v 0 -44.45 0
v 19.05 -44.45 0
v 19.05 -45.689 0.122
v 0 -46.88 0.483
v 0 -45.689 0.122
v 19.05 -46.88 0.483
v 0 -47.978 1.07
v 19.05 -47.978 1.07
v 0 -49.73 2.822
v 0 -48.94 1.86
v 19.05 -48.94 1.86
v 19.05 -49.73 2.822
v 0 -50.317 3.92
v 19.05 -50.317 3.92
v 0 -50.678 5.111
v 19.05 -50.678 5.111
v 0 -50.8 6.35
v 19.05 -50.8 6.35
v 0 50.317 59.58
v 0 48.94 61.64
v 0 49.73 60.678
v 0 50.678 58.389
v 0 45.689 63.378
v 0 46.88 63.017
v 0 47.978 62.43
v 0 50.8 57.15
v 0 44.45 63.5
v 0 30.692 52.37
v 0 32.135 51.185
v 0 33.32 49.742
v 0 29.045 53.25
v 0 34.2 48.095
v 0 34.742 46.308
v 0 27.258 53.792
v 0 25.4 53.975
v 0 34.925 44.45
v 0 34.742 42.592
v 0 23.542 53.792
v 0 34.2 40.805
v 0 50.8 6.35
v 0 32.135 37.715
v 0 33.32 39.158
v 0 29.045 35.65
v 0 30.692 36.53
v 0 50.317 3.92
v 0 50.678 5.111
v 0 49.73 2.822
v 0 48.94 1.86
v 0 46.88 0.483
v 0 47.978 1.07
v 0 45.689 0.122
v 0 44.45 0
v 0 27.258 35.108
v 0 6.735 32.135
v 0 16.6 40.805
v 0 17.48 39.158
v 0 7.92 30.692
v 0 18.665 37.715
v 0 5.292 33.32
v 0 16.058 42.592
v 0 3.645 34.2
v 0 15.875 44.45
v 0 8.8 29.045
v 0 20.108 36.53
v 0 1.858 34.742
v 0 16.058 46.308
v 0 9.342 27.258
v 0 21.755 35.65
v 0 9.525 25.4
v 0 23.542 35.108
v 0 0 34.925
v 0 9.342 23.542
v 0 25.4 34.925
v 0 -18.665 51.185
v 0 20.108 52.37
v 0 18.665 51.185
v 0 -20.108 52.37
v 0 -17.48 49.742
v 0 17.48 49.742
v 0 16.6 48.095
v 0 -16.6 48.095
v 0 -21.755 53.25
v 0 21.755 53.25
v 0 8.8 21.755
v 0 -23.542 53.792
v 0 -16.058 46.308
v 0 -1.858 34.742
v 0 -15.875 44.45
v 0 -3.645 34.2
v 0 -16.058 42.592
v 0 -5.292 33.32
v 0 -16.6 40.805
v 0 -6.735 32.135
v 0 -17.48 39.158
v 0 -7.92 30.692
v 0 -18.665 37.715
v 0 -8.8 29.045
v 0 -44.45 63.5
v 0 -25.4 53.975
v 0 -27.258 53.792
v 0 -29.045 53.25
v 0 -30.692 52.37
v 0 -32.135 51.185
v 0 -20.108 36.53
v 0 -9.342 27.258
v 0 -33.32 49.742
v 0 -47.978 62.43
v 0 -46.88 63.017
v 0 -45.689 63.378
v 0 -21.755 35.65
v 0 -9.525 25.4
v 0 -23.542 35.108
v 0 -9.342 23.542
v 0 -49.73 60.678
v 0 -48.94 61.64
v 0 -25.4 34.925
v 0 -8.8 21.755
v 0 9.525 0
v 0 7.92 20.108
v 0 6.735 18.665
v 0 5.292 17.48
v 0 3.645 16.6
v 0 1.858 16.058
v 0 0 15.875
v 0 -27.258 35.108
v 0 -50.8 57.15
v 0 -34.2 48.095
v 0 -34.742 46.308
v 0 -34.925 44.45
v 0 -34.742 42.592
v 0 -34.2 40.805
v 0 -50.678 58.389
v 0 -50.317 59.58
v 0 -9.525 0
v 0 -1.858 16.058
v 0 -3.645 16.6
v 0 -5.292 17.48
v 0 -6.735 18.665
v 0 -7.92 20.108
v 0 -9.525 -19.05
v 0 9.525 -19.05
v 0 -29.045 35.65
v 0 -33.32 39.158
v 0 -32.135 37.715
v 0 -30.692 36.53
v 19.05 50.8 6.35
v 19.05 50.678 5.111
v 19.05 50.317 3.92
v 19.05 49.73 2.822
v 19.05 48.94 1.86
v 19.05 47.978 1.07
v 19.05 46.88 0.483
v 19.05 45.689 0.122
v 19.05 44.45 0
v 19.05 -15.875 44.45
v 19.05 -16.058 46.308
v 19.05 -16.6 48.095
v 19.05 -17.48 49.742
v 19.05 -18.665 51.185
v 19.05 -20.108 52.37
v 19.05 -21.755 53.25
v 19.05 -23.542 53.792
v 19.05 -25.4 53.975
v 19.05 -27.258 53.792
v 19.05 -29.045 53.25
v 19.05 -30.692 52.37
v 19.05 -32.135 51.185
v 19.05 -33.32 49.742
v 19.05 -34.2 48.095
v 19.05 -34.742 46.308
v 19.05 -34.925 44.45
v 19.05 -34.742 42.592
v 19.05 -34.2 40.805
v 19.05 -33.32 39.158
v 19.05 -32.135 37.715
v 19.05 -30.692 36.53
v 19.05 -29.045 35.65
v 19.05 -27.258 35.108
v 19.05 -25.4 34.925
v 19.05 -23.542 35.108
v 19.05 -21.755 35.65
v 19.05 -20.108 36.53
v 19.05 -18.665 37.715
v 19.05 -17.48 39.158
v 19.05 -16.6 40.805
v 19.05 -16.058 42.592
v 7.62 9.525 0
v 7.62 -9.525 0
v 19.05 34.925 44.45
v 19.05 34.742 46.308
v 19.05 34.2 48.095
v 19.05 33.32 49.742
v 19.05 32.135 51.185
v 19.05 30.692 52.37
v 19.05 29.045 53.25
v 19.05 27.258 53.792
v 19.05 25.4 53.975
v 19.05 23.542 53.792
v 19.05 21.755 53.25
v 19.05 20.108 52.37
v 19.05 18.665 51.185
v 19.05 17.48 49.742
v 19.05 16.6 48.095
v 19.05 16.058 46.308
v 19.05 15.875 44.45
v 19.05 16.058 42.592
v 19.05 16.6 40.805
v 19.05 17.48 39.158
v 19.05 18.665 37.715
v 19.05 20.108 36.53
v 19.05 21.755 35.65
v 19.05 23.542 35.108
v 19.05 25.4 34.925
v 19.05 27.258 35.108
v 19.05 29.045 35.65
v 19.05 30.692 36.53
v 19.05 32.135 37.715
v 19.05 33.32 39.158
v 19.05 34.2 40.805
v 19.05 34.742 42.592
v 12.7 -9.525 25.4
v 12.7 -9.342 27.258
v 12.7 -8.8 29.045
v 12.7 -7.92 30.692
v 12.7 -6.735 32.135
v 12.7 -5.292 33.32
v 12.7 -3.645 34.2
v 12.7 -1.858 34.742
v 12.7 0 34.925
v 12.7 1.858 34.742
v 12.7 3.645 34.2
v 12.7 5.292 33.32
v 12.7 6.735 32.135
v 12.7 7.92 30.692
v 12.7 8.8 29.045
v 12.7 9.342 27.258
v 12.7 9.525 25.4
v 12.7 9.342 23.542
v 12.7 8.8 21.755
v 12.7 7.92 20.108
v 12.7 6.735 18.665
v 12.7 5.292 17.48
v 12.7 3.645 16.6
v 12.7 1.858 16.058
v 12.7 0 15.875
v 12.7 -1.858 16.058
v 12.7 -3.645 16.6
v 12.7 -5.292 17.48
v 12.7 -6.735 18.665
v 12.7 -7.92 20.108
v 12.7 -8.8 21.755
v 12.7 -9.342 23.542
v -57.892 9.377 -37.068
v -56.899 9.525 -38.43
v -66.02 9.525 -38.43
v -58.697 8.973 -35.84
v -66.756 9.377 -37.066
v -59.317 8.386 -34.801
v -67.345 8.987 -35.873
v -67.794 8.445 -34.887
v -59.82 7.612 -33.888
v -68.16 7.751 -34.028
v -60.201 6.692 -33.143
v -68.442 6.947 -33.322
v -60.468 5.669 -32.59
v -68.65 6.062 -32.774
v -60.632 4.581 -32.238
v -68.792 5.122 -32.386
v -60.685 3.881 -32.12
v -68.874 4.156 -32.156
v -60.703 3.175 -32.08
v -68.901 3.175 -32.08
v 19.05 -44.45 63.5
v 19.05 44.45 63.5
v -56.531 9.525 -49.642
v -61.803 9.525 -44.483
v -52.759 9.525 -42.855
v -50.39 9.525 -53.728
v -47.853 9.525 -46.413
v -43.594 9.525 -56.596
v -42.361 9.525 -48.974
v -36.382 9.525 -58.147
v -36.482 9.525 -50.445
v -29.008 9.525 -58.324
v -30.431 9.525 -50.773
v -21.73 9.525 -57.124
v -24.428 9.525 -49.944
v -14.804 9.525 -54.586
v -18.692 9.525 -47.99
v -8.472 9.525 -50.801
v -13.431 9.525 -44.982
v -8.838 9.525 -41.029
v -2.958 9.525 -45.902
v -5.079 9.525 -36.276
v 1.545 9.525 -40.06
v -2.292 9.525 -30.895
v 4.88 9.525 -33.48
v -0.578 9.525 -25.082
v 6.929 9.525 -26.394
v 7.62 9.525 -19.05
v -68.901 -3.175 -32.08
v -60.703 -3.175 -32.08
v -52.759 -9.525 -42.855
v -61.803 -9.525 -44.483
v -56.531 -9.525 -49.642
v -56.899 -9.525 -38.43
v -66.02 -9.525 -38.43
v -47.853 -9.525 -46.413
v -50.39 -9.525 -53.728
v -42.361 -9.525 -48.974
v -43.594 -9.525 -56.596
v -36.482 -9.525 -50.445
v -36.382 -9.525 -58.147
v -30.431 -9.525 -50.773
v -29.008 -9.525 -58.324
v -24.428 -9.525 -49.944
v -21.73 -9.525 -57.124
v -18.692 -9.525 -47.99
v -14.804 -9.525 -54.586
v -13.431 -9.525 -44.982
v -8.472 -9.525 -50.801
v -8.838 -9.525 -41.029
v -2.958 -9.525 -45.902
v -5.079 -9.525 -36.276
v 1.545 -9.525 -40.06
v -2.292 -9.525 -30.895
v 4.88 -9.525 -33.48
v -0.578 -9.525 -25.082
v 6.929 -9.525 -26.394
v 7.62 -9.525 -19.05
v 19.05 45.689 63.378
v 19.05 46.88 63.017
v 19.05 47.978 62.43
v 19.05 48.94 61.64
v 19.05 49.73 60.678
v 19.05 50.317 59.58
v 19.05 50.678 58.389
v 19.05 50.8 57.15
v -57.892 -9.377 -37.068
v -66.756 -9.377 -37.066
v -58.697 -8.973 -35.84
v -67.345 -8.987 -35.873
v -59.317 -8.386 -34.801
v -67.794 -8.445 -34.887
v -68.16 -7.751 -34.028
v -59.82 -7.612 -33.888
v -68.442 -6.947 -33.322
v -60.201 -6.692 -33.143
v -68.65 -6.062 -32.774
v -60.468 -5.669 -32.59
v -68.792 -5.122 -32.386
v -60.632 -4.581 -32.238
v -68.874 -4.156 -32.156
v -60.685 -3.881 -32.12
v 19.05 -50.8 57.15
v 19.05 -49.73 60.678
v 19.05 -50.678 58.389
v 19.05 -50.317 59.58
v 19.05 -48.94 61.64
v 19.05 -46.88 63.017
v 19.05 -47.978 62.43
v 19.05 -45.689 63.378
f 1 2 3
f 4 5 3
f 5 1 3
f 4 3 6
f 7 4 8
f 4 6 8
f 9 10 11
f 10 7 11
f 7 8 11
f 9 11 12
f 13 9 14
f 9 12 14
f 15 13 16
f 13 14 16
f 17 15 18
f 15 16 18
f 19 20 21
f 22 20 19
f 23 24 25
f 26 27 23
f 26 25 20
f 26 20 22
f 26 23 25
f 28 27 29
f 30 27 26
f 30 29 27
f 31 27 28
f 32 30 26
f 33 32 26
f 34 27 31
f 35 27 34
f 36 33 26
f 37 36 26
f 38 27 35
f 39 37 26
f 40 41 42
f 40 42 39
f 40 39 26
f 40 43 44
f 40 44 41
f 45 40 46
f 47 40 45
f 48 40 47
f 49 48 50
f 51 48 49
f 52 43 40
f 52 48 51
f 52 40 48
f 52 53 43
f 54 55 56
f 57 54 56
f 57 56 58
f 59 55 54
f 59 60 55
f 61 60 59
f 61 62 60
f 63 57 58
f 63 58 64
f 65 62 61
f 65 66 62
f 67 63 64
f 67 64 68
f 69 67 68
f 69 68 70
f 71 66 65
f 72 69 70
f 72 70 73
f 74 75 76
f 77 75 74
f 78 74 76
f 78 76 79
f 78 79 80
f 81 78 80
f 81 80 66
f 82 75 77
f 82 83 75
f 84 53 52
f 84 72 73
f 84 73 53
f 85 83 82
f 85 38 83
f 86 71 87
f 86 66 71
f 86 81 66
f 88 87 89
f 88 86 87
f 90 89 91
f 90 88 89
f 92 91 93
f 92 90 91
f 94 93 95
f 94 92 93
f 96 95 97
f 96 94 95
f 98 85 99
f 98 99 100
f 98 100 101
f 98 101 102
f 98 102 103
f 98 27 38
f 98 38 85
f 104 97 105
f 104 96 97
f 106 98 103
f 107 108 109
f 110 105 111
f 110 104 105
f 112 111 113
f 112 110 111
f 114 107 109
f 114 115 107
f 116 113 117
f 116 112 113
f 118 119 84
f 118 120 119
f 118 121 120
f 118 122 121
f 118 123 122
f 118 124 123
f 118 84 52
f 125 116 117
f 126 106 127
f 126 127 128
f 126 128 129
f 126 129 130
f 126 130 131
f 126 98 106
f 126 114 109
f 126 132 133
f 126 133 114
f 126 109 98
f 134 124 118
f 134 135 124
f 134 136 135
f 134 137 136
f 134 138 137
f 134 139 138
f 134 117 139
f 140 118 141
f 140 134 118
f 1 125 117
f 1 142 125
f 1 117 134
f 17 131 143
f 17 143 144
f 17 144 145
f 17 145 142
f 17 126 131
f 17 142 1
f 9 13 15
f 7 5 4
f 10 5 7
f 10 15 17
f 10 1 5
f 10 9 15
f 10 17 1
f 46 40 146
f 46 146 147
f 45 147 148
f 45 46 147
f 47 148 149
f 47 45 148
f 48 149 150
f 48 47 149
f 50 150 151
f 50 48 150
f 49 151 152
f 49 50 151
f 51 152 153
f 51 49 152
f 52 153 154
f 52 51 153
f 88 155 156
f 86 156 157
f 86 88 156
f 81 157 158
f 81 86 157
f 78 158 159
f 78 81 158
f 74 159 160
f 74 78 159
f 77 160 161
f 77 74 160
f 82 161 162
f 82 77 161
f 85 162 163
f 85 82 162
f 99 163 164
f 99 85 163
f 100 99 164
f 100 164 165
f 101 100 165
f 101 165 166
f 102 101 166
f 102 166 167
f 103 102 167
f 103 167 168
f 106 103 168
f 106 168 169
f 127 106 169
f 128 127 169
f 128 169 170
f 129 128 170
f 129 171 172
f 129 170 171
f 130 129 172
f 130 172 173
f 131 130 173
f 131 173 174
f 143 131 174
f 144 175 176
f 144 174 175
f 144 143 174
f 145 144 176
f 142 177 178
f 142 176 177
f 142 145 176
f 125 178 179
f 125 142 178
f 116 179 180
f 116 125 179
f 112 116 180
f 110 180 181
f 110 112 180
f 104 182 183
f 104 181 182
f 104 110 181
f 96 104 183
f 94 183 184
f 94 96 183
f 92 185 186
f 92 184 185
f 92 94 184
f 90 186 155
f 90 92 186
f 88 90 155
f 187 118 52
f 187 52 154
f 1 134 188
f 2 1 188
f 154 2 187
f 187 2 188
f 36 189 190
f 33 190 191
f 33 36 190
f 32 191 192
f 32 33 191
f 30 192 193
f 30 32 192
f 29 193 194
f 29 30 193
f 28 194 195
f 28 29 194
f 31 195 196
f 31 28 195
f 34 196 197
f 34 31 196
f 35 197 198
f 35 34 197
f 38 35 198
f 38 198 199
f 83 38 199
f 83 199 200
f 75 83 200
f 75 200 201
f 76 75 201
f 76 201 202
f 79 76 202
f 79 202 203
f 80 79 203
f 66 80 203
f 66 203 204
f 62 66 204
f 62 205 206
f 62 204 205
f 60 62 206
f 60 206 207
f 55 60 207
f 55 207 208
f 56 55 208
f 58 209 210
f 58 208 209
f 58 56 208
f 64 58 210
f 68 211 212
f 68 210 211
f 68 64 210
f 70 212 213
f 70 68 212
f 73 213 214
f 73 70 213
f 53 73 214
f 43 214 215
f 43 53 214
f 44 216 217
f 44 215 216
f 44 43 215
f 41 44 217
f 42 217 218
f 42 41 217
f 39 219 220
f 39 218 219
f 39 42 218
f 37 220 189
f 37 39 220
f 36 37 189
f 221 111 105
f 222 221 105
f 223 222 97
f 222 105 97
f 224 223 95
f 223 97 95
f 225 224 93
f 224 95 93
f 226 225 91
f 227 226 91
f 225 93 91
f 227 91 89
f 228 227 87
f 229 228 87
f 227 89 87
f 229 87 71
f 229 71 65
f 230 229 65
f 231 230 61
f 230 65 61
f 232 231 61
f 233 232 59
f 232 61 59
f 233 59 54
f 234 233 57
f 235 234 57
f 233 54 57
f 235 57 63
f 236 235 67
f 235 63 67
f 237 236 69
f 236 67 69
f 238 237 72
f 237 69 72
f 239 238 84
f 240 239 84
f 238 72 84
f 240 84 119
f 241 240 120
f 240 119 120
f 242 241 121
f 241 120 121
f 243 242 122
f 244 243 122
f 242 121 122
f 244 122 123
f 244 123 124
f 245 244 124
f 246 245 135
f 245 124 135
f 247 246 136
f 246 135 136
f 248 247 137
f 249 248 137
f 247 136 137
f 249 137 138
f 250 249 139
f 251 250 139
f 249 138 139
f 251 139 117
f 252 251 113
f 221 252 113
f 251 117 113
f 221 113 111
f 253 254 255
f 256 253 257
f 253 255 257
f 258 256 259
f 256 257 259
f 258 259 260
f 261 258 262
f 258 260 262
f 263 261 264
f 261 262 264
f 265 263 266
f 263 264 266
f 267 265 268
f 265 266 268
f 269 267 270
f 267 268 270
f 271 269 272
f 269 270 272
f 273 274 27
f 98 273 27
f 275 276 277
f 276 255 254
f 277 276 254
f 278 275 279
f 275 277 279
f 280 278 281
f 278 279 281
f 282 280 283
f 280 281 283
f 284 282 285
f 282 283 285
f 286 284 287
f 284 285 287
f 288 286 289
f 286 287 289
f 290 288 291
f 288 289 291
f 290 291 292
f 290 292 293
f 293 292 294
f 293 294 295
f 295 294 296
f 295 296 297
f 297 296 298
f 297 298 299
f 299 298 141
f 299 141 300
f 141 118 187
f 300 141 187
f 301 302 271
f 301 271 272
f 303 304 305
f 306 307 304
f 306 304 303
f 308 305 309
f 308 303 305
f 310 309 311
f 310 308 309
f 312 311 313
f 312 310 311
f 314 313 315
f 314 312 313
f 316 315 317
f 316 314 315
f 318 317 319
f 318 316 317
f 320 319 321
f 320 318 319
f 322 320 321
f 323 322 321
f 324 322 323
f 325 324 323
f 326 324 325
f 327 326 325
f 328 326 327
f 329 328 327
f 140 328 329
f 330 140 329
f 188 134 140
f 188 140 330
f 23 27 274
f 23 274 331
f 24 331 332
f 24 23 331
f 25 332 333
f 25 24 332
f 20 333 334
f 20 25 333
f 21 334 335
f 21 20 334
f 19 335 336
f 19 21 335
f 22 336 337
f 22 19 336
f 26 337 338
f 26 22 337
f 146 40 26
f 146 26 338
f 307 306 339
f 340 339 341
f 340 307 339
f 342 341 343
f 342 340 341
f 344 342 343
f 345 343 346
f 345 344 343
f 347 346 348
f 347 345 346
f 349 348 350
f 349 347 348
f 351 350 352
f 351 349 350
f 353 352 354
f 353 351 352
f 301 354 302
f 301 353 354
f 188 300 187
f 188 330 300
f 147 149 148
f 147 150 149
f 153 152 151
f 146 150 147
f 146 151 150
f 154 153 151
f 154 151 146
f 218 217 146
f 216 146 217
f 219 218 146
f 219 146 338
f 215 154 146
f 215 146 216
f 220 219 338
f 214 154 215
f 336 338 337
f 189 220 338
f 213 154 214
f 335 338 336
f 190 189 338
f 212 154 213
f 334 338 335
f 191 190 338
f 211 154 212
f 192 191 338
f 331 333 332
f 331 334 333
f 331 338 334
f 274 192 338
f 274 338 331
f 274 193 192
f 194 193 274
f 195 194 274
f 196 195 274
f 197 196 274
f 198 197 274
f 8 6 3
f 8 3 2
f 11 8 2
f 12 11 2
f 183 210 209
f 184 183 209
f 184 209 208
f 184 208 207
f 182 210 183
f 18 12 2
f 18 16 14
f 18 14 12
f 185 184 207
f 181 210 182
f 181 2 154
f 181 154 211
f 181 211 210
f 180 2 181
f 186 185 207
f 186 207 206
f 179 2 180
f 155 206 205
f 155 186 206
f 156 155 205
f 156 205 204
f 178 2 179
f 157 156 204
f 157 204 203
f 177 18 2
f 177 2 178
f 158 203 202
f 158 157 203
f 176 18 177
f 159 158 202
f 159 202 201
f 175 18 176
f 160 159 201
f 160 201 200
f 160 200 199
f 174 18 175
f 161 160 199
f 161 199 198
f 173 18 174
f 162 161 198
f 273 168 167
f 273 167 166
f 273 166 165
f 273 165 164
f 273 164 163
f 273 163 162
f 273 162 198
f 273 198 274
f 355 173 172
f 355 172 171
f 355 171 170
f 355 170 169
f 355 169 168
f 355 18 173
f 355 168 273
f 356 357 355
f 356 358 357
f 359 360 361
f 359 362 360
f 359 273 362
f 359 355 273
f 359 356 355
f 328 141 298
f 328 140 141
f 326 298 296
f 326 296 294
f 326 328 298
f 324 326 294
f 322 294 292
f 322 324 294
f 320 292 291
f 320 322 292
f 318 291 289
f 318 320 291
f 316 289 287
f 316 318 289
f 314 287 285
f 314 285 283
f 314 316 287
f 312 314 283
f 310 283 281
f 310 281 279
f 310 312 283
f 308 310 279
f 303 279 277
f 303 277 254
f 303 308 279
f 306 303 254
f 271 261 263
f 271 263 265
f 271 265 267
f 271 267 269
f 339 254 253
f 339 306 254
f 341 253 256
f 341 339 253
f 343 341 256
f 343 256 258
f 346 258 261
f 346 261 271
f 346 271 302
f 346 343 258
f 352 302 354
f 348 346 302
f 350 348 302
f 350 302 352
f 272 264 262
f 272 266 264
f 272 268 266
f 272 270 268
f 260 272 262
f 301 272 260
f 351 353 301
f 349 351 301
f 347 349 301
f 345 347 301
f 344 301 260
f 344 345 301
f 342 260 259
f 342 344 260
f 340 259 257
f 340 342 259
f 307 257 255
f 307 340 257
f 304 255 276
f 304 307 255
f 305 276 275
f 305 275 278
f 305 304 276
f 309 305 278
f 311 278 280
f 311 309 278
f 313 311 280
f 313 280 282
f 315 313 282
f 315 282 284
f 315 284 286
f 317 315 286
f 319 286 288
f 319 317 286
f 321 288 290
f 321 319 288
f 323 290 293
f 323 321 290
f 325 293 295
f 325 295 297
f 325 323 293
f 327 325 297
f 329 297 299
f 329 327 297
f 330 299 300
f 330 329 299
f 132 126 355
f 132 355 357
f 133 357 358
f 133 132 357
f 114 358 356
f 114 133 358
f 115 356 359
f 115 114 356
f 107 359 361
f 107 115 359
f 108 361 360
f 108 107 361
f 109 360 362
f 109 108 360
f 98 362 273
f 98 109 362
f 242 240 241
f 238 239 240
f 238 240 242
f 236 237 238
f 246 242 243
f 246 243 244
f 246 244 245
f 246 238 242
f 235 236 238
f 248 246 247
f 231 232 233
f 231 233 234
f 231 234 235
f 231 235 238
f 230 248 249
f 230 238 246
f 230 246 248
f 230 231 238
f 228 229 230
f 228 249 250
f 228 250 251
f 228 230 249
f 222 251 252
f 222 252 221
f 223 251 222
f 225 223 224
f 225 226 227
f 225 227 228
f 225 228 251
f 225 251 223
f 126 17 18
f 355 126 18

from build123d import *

# Parameters (mm, degrees)
F0_W     = 7.62
F0_H     = 19.05
F1_DEPTH = 9.525
F2_DEPTH = 50.8
F3_R     = 9.525
F4_DEPTH = 19.051
F5_R     = 9.525
F6_DEPTH = 12.7
F8_DEPTH = 2540
F9_R     = 6.35


with BuildPart() as f1:
    # F0 (on Front) → F1 (new body, symmetric)
    with BuildSketch(Plane.XZ):
        with Locations((3.81, -9.525)):
            Rectangle(F0_W, F0_H)
        with BuildLine():
            Line((7.62, -19.05), (0, -19.05))
            ThreePointArc((0, -19.05), (-25.0864929701, -50.0928763819), (-60.7030030905, -32.0802))
            Line((-60.7030030905, -32.0802), (-68.9011882443, -32.0802))
            ThreePointArc((-68.9011882443, -32.0802), (-25.1411188986, -57.8613332751), (7.62, -19.05))
        make_face()
    extrude(amount=F1_DEPTH, both=True)

    # F0 (on Front) → F2 (join, symmetric)
    with BuildSketch(Plane.XZ):
        Polygon((0, 63.5), (0, 0), (7.62, 0), (19.05, 0), (19.05, 63.5), align=None)
    extrude(amount=F2_DEPTH, both=True)

    # F3 (on Right) → F4 (cut, through all)
    with BuildSketch(Plane.YZ):
        with Locations((25.4, 44.45)):
            Circle(F3_R)
        with Locations((-25.4, 44.45)):
            Circle(F3_R)
    extrude(amount=F4_DEPTH, mode=Mode.SUBTRACT)

    # F5 (on face) → F6 (cut)
    with BuildSketch(Plane(origin=(0, 0, 0), x_dir=(0, -1, 0), z_dir=(-1, 0, 0))):
        with Locations((0, 25.4)):
            Circle(F5_R)
    extrude(amount=-F6_DEPTH, mode=Mode.SUBTRACT)

    # F7 (on Right) → F8 (cut, symmetric)
    with BuildSketch(Plane.YZ):
        with BuildLine():
            ThreePointArc((44.45, 63.5), (48.9401280605, 61.6401280605), (50.8, 57.15))
            Line((50.8, 57.15), (50.8, 63.5))
            Line((50.8, 63.5), (44.45, 63.5))
        make_face()
        with BuildLine():
            Line((-50.8, 63.5), (-50.8, 57.15))
            ThreePointArc((-50.8, 57.15), (-48.9401280605, 61.6401280605), (-44.45, 63.5))
            Line((-44.45, 63.5), (-50.8, 63.5))
        make_face()
        with BuildLine():
            Line((50.8, 0), (50.8, 6.35))
            ThreePointArc((50.8, 6.35), (48.9401280605, 1.8598719395), (44.45, 0))
            Line((44.45, 0), (50.8, 0))
        make_face()
        with BuildLine():
            Line((-50.8, 0), (-44.45, 0))
            ThreePointArc((-44.45, 0), (-48.9401280605, 1.8598719395), (-50.8, 6.35))
            Line((-50.8, 6.35), (-50.8, 0))
        make_face()
    extrude(amount=F8_DEPTH, both=True, mode=Mode.SUBTRACT)

    # F9
    f9_edges = [f1.edges().sort_by_distance(p)[0] for p in [
        (-64.802096, 9.525, -32.0802),
        (-64.802096, -9.525, -32.0802),
    ]]
    fillet(f9_edges, radius=F9_R)


solid = f1.part
